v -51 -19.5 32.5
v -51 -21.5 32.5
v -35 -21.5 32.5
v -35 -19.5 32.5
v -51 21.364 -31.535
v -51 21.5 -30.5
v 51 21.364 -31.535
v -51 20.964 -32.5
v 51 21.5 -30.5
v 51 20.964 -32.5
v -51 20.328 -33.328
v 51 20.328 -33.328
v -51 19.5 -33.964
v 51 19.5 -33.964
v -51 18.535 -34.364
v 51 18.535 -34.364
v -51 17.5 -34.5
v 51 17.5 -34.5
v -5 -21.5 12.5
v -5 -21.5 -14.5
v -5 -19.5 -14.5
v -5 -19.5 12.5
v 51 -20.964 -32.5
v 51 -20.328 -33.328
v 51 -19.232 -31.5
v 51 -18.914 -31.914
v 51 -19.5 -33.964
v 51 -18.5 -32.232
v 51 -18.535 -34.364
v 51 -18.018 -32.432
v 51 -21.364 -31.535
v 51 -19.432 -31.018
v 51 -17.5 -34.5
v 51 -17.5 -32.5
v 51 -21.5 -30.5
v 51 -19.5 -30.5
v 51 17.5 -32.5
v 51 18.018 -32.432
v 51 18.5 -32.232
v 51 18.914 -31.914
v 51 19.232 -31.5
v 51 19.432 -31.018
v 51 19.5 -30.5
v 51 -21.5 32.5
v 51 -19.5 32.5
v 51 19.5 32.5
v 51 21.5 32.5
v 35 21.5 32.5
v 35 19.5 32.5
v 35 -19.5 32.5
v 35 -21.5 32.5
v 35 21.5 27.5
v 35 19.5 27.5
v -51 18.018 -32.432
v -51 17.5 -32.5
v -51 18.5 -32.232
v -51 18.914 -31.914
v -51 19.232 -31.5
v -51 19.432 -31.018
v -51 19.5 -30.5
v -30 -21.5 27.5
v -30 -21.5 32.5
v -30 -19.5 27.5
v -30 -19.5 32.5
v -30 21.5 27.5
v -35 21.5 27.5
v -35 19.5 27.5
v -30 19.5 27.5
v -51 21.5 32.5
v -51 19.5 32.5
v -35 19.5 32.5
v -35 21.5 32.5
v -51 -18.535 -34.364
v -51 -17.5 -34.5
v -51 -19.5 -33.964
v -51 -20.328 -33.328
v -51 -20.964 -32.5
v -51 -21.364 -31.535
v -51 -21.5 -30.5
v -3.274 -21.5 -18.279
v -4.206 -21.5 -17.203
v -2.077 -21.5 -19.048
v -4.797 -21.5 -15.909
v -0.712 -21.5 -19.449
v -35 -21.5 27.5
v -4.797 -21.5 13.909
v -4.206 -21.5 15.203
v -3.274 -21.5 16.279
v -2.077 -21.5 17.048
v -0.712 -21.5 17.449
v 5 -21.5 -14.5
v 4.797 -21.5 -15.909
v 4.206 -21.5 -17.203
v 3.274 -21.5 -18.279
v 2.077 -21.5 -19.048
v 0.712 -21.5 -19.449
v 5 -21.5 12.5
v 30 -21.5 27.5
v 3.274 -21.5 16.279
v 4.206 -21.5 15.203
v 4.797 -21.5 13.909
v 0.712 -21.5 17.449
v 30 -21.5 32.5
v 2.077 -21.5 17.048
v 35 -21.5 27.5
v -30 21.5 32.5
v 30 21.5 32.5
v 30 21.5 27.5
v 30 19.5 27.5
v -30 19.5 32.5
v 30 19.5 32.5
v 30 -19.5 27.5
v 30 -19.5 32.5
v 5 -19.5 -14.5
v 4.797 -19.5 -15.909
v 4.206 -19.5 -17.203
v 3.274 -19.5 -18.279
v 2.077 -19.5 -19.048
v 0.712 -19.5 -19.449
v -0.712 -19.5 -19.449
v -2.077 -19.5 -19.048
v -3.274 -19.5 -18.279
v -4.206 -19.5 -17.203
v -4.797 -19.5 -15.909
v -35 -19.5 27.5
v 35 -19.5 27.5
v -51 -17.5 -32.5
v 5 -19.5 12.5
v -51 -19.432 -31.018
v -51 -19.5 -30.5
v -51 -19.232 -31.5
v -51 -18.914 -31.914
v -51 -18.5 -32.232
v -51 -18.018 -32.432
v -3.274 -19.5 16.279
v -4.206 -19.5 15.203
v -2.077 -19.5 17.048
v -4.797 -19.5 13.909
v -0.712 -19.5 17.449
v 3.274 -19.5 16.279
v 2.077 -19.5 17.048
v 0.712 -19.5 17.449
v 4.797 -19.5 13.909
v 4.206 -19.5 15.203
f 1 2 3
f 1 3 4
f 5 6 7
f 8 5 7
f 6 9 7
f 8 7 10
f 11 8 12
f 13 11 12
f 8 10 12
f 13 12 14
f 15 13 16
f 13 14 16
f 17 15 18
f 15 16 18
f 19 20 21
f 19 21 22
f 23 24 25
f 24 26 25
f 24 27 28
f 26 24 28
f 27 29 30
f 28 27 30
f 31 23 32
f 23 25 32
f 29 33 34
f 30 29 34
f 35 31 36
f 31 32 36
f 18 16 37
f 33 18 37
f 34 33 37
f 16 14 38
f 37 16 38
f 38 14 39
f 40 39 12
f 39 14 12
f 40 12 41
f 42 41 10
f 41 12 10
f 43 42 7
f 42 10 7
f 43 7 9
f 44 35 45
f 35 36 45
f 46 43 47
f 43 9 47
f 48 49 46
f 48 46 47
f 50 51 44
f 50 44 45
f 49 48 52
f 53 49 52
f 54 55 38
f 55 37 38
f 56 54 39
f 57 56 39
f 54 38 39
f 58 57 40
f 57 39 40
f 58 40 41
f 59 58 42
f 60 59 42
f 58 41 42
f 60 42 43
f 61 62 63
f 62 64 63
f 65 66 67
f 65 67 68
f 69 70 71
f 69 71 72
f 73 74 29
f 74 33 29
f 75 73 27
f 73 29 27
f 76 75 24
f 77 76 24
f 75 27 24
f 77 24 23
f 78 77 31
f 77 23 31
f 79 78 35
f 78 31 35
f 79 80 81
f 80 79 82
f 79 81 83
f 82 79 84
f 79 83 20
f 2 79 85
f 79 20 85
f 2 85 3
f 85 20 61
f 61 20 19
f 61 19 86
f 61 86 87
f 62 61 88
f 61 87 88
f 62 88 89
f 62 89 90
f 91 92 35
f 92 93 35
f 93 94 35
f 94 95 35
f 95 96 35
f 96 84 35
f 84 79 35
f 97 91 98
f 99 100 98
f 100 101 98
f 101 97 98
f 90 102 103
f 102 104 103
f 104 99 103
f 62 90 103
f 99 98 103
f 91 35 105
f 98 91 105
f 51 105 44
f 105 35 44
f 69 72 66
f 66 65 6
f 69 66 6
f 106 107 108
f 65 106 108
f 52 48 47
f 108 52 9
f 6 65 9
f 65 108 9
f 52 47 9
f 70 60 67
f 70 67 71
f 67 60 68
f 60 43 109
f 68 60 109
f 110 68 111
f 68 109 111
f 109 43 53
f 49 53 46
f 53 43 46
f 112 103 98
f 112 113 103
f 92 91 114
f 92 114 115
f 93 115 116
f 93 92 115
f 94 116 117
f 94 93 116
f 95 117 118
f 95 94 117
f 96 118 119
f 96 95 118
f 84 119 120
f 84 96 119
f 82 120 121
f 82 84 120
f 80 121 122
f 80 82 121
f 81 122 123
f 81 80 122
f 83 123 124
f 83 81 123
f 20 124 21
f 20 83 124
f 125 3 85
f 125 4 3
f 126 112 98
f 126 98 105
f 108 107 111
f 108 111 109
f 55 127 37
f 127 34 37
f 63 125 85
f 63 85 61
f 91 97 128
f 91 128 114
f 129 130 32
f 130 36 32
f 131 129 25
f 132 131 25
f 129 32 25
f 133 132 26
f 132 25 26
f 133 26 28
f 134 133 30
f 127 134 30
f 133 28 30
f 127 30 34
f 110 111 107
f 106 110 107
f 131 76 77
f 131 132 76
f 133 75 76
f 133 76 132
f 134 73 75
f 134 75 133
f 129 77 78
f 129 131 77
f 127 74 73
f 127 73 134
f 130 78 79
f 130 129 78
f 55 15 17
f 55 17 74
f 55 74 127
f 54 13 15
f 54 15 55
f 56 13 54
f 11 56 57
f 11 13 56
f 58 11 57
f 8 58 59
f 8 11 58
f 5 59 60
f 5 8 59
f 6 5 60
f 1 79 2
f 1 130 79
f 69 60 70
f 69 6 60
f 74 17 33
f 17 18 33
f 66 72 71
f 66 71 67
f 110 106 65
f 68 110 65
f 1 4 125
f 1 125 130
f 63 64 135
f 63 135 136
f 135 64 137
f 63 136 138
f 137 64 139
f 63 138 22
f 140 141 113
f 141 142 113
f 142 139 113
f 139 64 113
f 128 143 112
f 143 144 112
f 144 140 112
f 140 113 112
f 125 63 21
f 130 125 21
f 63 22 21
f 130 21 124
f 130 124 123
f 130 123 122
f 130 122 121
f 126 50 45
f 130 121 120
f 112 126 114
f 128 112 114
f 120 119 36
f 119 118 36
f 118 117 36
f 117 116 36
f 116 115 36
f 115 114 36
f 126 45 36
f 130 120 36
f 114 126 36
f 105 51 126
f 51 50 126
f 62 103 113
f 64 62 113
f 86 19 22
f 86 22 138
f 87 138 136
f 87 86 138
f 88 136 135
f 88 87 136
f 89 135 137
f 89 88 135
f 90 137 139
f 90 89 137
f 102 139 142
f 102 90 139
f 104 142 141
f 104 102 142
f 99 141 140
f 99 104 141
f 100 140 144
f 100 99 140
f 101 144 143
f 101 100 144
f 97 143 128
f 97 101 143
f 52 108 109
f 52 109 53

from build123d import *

# Parameters (mm, degrees)
SM_BASE_FLANGE_1_DEPTH = 51
CUT_EXTRUDE_1_REACH    = 77.102
SKETCH_3_W             = 5
SKETCH_3_H             = 10
CUT_EXTRUDE_2_DEPTH    = 76.101597853


# Sheet-metal steps are written as plain solids
with BuildPart() as part:
    # Sketch 1 → 基体-法兰1 (new, symmetric)
    with BuildSketch(Plane(origin=(0, 0, 0), x_dir=(0, 0, -1), z_dir=(1, 0, 0))):
        with BuildLine():
            Line((-32.5, -19.5), (30.5, -19.5))
            ThreePointArc((30.5, -19.5), (31.914213562, -18.914213562), (32.5, -17.5))
            Line((32.5, -17.5), (32.5, 17.5))
            ThreePointArc((32.5, 17.5), (31.914213562, 18.914213562), (30.5, 19.5))
            Line((30.5, 19.5), (-32.5, 19.5))
            Line((-32.5, 19.5), (-32.5, 21.5))
            Line((-32.5, 21.5), (30.5, 21.5))
            ThreePointArc((30.5, 21.5), (33.328427125, 20.328427125), (34.5, 17.5))
            Line((34.5, 17.5), (34.5, -17.5))
            ThreePointArc((34.5, -17.5), (33.328427125, -20.328427125), (30.5, -21.5))
            Line((30.5, -21.5), (-32.5, -21.5))
            Line((-32.5, -21.5), (-32.5, -19.5))
        make_face()
    extrude(amount=SM_BASE_FLANGE_1_DEPTH, both=True)

    # Sketch 2 → 切除-拉伸1 (cut, up to next)
    with BuildSketch(Plane.XZ.offset(21.5), mode=Mode.PRIVATE) as cut_extrude_1_sk1:
        with BuildLine():
            Line((5, 12.5), (5, -14.5))
            ThreePointArc((5, -14.5), (0, -19.5), (-5, -14.5))
            Line((-5, -14.5), (-5, 12.5))
            ThreePointArc((-5, 12.5), (0, 17.5), (5, 12.5))
        make_face()
    cut_extrude_1_tool1 = extrude(cut_extrude_1_sk1.sketch, amount=-CUT_EXTRUDE_1_REACH, mode=Mode.PRIVATE) & part.part
    add(cut_extrude_1_tool1.solids().sort_by_distance((0, -21.5, -1))[0], mode=Mode.SUBTRACT)

    # 草图3 → 切除-拉伸2 (cut, through all)
    with BuildSketch(Plane(origin=(0, 21.5, 0), x_dir=(1, 0, 0), z_dir=(0, 1, 0))):
        with Locations((-32.5, -32.5)):
            Rectangle(SKETCH_3_W, SKETCH_3_H)
        with Locations((32.5, -32.5)):
            Rectangle(SKETCH_3_W, SKETCH_3_H)
    extrude(amount=-CUT_EXTRUDE_2_DEPTH, mode=Mode.SUBTRACT)


solid = part.part
